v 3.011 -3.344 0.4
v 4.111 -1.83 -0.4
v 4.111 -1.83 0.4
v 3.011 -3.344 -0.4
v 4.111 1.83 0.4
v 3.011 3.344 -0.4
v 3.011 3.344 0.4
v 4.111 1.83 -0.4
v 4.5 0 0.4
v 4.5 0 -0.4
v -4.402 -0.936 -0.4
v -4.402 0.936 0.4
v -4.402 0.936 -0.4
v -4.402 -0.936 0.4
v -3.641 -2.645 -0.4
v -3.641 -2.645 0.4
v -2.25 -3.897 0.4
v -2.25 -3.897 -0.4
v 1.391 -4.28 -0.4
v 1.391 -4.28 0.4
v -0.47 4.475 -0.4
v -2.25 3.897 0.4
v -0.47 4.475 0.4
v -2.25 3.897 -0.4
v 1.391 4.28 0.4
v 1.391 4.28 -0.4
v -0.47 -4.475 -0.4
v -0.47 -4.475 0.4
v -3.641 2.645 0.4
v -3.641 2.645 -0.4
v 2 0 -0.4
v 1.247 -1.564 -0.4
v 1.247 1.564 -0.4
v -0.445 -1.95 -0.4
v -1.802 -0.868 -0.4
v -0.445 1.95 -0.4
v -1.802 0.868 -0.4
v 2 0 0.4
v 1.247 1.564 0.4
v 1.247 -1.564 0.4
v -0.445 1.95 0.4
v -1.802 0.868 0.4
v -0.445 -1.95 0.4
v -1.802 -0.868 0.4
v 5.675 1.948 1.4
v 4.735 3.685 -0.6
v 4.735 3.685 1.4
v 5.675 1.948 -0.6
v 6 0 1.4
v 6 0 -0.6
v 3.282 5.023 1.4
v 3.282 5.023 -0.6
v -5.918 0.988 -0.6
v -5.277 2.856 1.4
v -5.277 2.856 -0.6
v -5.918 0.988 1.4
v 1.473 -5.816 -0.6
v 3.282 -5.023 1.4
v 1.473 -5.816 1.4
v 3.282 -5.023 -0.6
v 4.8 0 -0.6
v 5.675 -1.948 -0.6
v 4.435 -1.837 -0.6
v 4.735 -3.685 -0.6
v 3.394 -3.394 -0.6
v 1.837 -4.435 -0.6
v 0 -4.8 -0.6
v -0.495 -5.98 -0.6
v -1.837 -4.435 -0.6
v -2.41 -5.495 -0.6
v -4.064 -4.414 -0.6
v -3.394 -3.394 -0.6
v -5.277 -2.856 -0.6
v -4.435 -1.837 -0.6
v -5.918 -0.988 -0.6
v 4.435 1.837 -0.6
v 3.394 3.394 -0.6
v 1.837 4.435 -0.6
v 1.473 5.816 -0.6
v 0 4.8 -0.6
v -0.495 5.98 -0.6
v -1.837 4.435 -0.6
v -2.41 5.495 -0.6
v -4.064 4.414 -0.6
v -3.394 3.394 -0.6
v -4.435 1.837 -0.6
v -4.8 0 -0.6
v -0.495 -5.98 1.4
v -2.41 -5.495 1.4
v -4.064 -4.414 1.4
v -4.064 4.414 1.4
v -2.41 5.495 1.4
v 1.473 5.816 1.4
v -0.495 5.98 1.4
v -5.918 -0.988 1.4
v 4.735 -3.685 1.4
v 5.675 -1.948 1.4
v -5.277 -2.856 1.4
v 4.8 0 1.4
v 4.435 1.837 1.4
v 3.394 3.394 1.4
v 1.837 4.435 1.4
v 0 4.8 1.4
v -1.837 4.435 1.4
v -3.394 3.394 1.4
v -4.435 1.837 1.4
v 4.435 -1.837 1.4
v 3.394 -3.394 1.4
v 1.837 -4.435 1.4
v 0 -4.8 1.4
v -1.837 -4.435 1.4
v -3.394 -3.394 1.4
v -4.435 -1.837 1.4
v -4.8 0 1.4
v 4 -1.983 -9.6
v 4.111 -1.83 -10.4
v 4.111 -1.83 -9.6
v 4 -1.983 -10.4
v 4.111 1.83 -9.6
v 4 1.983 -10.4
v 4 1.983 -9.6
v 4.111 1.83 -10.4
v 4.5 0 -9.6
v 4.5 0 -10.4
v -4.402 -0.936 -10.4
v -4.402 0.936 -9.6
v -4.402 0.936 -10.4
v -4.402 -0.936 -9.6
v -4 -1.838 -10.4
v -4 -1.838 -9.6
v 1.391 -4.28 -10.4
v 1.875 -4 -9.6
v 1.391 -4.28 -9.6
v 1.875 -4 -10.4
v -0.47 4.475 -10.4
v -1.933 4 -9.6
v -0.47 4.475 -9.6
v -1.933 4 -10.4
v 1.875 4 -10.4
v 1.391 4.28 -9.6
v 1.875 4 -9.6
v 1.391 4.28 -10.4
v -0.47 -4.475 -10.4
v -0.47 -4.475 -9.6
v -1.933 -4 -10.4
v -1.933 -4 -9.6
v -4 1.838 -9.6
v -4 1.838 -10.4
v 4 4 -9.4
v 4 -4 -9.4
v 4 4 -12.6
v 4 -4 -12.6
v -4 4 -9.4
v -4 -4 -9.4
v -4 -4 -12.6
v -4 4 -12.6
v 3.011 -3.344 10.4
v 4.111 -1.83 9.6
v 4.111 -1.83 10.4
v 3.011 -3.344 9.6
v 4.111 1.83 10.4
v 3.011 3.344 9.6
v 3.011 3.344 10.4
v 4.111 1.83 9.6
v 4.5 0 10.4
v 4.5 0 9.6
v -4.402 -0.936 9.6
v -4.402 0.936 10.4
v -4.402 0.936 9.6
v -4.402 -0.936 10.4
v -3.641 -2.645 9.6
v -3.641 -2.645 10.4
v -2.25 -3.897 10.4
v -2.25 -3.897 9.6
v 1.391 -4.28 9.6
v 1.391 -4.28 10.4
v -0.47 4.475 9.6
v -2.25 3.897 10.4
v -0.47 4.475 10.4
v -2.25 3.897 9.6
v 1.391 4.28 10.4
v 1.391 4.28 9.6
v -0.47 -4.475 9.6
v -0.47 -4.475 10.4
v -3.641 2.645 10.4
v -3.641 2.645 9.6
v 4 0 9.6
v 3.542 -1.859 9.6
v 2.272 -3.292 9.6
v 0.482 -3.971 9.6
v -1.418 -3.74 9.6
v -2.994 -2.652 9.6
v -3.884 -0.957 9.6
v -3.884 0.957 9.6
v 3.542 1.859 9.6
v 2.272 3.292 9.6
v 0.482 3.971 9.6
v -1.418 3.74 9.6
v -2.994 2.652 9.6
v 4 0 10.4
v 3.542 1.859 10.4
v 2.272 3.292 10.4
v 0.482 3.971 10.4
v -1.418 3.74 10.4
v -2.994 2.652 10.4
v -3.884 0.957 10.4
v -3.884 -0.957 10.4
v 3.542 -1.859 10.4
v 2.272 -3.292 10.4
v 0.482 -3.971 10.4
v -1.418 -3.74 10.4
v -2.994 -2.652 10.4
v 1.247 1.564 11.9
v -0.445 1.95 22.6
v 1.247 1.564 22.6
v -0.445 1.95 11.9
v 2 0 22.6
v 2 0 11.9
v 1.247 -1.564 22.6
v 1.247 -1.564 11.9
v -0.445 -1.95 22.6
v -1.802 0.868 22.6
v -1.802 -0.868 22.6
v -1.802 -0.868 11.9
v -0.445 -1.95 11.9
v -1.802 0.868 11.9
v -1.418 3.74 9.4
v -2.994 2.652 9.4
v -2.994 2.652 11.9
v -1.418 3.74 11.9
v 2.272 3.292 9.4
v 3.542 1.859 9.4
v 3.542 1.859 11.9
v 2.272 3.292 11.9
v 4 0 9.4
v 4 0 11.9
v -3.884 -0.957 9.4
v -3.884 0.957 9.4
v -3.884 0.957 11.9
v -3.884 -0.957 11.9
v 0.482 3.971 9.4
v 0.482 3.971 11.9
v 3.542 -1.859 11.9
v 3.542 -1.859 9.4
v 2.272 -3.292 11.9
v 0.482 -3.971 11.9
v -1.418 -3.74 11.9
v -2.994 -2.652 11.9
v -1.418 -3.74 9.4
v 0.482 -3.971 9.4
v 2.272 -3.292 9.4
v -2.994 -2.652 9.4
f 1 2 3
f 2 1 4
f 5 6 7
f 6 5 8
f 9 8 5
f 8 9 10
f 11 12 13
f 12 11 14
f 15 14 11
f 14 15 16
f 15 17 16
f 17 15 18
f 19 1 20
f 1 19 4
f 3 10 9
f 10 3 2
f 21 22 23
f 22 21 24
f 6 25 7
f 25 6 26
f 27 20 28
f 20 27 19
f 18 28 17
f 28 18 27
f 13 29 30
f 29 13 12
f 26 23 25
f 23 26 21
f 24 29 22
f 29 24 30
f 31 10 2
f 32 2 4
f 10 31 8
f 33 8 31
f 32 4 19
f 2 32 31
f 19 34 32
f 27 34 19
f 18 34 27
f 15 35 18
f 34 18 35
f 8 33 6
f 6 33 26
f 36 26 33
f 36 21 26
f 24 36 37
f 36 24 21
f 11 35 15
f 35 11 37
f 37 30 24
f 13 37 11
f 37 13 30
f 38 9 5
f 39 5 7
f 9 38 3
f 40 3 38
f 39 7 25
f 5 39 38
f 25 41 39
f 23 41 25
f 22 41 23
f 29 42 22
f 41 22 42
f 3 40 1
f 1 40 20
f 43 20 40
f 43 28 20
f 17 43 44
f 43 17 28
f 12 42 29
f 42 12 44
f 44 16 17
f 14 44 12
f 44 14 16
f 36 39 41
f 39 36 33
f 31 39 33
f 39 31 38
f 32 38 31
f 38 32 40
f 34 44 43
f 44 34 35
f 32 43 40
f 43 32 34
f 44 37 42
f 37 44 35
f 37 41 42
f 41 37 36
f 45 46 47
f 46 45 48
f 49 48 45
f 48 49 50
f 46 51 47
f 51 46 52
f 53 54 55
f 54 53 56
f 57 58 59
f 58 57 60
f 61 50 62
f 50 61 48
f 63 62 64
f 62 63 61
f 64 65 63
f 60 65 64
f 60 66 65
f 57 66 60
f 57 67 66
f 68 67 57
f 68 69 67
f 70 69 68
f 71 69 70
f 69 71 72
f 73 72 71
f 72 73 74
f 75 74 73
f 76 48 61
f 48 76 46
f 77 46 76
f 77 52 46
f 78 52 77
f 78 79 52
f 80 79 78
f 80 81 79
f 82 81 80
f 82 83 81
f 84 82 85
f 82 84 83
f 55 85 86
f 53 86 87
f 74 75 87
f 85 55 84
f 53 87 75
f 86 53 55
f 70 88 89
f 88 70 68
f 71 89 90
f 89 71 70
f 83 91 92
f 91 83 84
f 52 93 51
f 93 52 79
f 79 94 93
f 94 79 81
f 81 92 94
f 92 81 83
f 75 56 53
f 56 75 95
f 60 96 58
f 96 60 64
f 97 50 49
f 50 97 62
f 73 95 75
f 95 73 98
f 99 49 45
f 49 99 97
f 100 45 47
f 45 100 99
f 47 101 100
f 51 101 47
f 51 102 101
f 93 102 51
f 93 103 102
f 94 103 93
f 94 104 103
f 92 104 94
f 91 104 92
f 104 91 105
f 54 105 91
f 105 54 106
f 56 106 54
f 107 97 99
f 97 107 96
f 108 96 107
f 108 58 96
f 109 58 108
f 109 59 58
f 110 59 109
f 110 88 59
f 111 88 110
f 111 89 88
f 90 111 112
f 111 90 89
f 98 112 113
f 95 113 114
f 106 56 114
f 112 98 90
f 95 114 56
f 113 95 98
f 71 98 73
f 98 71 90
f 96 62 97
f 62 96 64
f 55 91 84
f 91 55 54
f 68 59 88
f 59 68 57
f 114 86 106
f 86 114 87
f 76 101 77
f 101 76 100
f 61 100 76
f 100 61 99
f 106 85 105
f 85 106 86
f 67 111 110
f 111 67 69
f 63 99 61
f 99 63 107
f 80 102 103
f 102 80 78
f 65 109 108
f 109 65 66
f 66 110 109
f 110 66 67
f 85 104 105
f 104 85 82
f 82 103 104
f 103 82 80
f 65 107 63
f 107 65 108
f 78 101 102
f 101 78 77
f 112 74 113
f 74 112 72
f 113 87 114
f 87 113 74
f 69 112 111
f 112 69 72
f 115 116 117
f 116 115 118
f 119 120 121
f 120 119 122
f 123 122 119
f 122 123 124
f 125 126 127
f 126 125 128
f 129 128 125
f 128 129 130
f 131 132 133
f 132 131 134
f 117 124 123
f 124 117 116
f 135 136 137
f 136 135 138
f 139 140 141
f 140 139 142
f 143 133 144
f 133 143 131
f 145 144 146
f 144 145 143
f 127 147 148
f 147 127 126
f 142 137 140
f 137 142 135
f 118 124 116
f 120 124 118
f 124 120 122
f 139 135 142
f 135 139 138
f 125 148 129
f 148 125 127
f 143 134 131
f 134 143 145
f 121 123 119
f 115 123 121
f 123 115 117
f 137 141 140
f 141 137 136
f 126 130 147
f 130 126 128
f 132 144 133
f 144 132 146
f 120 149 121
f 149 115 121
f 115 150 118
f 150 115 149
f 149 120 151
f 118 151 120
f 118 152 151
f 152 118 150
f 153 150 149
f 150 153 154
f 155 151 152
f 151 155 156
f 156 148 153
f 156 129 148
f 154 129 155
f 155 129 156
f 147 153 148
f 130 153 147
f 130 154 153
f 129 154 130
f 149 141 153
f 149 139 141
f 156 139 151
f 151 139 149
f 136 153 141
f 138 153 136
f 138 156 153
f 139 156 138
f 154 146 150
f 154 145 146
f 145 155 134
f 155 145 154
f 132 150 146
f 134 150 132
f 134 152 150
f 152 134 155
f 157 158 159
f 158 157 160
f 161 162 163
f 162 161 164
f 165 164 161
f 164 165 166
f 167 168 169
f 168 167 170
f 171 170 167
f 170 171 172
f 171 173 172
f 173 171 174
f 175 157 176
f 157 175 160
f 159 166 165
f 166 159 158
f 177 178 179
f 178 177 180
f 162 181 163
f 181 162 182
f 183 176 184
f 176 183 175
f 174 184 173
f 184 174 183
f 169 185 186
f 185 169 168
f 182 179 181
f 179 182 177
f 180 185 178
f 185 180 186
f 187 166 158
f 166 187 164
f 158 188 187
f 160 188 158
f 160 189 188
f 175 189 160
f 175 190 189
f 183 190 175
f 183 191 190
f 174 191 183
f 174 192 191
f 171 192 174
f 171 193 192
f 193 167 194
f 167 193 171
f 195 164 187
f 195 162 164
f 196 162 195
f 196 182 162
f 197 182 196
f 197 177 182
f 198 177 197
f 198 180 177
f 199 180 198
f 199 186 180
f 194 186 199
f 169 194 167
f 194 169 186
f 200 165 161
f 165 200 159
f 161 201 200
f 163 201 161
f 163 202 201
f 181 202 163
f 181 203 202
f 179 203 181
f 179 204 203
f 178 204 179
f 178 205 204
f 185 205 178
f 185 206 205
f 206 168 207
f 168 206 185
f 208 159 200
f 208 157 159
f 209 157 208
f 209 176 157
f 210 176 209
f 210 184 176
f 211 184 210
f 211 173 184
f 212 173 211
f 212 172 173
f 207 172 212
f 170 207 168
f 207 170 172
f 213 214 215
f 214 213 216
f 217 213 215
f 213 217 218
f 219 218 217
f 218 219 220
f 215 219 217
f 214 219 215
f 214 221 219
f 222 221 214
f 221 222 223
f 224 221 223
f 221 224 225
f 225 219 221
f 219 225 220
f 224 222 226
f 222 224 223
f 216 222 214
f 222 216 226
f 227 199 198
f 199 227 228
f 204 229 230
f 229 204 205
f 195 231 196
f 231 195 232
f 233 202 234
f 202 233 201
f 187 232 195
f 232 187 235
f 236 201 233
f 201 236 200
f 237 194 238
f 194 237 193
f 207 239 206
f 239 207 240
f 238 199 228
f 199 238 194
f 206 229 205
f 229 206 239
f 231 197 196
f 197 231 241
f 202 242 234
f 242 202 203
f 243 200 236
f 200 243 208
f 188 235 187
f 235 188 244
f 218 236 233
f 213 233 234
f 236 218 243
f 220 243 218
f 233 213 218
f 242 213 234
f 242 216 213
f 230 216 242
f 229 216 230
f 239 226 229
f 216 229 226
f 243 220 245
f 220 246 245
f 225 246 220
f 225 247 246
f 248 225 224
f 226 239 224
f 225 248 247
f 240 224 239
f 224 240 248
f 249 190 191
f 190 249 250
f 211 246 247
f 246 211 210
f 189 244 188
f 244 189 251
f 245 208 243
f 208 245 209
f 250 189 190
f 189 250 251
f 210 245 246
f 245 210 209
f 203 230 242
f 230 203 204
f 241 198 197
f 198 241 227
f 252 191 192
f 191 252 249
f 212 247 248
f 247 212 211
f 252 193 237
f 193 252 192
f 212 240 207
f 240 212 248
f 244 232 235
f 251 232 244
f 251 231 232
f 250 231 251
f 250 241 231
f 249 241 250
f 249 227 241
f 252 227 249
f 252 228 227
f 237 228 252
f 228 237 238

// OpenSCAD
// Parameters
inner_diameter_mm = 4.0; //[2.0:8.0:0.1]
outer_diameter_mm = 9.0; //[4.5:18.0:0.1]
thickness_mm = 0.8; //[0.4:1.6:0.05]
inner_radius_mm = 2.0; //[1.0:4.0:0.05]
outer_radius_mm = 4.5; //[2.25:9.0:0.05]
overlap_mm = 1.0; //[0.5:2.0:0.1]
hole_cut_height_mm = 3.0; //[1.6:10.0:0.1]
grommet_wall_mm = 1.2; //[0.6:2.4:0.1]
grommet_top_height_mm = 2.0; //[1.0:6.0:0.1]
grommet_outer_radius_mm = 6.0; //[4.8:12.0:0.1]
nut_flat_width_mm = 8.0; //[4.0:16.0:0.1]
nut_thickness_mm = 3.2; //[1.6:6.4:0.1]
screw_shank_radius_mm = 2.0; //[1.0:4.0:0.05]
screw_shank_length_mm = 12.0; //[6.0:24.0:0.5]
screw_head_radius_mm = 4.0; //[2.0:8.0:0.1]
screw_head_height_mm = 2.5; //[1.2:5.0:0.1]

// Washer - base geometry
module washer_solid() {
  color("Silver") difference() {
    cylinder(r=outer_radius_mm, h=thickness_mm, center=true);
    cylinder(r=inner_radius_mm, h=hole_cut_height_mm, center=true);
  }
}

// Round Grommet Top - detailed geometry
module round_grommet_top() {
  color("DimGray") difference() {
    translate([0, 0, thickness_mm/2 + grommet_top_height_mm/2 - overlap_mm])
      cylinder(r=grommet_outer_radius_mm, h=grommet_top_height_mm, center=true);
    translate([0, 0, thickness_mm/2 + grommet_top_height_mm/2 - overlap_mm])
      cylinder(r=grommet_outer_radius_mm - grommet_wall_mm, h=grommet_top_height_mm + 2*overlap_mm, center=true);
  }
}

// Round Grommet Assembly - combines washer and grommet
module round_grommet_assembly() {
  union() {
    washer_solid();
    round_grommet_top();
  }
}

// Nut and Washer - detailed geometry
module nut_and_washer() {
  color("Black") union() {
    washer_solid();
    translate([0, 0, -thickness_mm/2 - nut_thickness_mm/2 + overlap_mm])
      cube([nut_flat_width_mm, nut_flat_width_mm, nut_thickness_mm], center=true);
  }
}

// Screw and Washer - detailed geometry
module screw_and_washer() {
  color("SteelBlue") union() {
    washer_solid();
    translate([0, 0, screw_shank_length_mm/2 - thickness_mm/2 + overlap_mm])
      cylinder(r=screw_shank_radius_mm, h=screw_shank_length_mm, center=true);
    translate([0, 0, thickness_mm/2 + screw_head_height_mm/2 - overlap_mm])
      cylinder(r=screw_head_radius_mm, h=screw_head_height_mm, center=true);
  }
}

// Final Assembly
module assembly() {
  round_grommet_assembly();
  translate([0, 0, -10]) nut_and_washer();
  translate([0, 0, 10]) screw_and_washer();
}

assembly();
